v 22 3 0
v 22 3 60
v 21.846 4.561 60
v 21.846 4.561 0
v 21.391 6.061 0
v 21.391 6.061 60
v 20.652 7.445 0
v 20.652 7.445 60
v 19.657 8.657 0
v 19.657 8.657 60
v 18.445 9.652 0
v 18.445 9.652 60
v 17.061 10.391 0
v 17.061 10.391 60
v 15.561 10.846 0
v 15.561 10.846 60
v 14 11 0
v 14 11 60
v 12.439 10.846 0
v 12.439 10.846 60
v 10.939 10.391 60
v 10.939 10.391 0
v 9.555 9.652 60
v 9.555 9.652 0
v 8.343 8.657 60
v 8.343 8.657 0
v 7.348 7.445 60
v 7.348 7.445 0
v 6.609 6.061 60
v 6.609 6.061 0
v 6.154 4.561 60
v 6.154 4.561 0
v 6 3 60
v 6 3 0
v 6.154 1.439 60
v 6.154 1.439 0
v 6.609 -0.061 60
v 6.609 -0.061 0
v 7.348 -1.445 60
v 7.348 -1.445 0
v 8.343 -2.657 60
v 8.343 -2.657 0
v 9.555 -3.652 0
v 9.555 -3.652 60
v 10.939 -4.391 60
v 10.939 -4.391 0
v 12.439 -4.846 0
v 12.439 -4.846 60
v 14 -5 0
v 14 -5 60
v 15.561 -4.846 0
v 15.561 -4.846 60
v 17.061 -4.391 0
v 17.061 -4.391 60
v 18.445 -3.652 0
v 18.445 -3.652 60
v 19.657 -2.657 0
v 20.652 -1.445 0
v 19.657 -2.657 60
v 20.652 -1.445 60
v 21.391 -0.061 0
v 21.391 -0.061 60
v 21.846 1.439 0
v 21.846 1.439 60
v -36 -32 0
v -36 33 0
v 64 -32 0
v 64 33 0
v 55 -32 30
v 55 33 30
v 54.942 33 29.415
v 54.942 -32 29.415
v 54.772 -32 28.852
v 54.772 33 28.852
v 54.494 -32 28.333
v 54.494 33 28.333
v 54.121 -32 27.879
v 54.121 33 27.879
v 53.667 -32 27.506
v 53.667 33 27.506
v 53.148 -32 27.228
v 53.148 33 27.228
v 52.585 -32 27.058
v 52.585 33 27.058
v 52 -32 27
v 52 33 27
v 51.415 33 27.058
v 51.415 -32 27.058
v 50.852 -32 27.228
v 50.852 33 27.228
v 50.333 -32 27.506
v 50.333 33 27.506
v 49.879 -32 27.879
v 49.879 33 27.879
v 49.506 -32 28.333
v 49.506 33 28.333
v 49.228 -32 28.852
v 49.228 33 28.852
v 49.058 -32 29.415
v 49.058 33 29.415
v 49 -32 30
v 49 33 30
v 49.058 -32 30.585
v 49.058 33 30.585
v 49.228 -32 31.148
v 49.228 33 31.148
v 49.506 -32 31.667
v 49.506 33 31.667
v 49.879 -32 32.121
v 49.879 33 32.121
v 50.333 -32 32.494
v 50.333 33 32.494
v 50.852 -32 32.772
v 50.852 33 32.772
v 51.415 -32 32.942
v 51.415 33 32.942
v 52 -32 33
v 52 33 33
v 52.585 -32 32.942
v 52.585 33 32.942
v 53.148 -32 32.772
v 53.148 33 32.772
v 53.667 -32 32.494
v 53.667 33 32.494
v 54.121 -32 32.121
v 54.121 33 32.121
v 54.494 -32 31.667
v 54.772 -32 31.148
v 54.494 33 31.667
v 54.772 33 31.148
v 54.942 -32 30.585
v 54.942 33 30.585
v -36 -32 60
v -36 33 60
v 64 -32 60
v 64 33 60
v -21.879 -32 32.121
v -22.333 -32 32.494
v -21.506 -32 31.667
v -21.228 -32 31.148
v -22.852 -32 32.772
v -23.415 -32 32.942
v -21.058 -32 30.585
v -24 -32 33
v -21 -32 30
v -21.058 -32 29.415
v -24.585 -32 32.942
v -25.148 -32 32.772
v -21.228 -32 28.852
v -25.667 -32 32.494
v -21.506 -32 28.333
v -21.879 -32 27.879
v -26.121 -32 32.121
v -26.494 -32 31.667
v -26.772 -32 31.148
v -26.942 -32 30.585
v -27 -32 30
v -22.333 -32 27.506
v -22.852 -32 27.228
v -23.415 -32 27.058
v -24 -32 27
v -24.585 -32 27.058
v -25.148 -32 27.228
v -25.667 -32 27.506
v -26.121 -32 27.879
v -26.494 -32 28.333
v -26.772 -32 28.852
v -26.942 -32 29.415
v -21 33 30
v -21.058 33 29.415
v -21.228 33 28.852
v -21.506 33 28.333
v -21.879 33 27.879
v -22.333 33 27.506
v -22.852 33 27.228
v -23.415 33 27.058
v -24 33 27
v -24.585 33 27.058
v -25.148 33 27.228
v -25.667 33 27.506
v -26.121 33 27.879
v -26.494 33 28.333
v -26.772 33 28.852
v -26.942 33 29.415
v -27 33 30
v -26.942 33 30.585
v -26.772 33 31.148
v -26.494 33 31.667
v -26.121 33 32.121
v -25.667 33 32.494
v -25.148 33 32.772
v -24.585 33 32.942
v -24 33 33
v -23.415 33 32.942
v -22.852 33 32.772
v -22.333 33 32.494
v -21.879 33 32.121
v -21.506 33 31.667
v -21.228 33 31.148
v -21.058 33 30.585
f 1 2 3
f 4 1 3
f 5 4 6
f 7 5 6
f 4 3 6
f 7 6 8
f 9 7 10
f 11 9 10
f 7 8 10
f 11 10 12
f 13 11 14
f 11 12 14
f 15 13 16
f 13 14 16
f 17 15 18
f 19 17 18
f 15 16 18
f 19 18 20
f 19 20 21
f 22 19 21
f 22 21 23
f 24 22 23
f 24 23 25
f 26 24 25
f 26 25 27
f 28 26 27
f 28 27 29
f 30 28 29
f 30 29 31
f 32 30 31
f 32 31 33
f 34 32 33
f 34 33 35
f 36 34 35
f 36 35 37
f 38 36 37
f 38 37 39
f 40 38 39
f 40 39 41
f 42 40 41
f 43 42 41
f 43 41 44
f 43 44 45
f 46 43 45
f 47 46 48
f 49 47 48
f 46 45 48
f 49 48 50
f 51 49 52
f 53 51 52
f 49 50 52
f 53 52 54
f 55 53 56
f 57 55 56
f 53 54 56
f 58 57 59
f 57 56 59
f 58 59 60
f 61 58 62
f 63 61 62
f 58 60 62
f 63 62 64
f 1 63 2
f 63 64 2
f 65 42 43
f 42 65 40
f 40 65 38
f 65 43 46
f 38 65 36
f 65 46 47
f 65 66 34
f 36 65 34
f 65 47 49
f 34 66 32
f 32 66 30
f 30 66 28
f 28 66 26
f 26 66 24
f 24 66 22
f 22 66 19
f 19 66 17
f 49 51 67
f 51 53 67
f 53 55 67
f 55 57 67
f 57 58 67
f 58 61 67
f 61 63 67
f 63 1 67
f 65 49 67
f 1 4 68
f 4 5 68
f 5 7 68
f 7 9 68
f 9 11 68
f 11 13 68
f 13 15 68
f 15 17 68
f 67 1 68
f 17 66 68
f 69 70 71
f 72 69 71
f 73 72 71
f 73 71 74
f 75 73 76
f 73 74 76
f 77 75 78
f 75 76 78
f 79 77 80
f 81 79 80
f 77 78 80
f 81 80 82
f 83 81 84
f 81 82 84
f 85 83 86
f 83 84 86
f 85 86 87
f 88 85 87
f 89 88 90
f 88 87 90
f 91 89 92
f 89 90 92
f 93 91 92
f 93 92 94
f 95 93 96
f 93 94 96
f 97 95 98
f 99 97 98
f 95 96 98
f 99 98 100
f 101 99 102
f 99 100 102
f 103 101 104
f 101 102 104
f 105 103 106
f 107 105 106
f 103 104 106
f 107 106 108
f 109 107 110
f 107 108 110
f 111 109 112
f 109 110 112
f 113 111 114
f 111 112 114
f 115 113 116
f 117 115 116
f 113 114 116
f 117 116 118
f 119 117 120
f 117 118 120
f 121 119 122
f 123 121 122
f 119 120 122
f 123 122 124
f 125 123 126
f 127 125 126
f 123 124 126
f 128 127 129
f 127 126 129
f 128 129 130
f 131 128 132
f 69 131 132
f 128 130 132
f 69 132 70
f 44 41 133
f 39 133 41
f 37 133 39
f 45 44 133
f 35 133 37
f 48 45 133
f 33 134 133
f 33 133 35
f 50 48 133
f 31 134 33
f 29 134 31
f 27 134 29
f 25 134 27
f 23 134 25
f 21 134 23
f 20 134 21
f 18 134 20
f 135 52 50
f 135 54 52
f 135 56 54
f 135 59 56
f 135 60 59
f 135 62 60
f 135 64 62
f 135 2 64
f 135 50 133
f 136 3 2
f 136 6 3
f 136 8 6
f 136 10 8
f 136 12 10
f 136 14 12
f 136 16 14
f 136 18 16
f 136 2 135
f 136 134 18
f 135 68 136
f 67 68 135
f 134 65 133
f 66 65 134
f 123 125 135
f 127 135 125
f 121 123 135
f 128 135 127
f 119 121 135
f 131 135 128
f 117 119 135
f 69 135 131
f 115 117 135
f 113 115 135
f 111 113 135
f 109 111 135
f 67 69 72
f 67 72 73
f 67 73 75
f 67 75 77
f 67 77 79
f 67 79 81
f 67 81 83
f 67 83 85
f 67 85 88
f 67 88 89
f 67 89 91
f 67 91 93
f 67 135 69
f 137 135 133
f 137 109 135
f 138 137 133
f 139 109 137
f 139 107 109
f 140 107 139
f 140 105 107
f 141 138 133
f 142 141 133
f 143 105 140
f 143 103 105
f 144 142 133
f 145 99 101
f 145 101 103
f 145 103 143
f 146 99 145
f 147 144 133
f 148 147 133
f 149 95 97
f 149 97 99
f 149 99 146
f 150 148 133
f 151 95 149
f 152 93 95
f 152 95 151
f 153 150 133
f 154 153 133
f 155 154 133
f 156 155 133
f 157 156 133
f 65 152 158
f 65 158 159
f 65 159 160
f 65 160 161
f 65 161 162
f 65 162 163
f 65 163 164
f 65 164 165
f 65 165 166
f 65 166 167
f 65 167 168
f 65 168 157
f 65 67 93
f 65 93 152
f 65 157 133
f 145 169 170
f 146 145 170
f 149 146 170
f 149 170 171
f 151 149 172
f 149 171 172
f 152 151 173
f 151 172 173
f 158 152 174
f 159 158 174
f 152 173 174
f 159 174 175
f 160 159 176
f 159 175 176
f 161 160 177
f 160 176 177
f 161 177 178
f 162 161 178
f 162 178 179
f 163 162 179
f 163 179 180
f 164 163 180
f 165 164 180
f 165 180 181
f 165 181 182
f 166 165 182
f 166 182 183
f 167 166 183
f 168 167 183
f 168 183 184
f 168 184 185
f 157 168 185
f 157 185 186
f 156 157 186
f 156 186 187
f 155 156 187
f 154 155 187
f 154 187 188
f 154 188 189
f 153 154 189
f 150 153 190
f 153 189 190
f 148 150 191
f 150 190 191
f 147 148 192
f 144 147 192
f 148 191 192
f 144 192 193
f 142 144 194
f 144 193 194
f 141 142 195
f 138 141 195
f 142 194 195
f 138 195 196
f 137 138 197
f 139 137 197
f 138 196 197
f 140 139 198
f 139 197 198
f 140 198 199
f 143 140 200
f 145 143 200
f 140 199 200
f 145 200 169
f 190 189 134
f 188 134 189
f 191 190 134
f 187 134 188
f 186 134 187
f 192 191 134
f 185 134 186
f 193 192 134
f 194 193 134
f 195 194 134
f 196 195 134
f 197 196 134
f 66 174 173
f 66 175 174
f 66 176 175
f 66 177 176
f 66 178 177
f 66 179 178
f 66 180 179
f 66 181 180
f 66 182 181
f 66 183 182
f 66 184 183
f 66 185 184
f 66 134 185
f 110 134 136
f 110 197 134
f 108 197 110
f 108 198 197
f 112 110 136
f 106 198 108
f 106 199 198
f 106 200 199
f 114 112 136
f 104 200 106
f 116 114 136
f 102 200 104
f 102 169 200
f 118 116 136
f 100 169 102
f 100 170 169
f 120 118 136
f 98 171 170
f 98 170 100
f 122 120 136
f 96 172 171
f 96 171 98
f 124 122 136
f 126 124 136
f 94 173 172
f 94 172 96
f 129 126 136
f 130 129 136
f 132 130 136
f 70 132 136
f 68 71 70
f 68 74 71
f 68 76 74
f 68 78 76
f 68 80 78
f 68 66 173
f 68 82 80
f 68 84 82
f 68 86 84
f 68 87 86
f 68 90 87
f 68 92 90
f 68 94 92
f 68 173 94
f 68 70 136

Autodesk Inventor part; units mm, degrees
ref_plane "YZ Plane" through (0, 0, 0) normal (1, 0, 0) x (0, 1, 0)
ref_plane "XZ Plane" through (0, 0, 0) normal (0, 1, 0) x (-1, 0, 0)
ref_plane "XY Plane" through (0, 0, 0) normal (0, 0, 1) x (1, 0, 0)
sketch "Sketch1" plane through (0, 0, 0) normal (0, 0, 1) x (1, 0, 0)
  line L0 (-36, 33) -> (64, 33)
  line L1 (64, 33) -> (64, -32)
  line L2 (64, -32) -> (-36, -32)
  line L3 (-36, -32) -> (-36, 33)
  point P0 (0, 0)
  dimension "d0" = 100
  dimension "d1" = 65
extrude "Extrusion1" add sketch "Sketch1" along normal blind 60
sketch "Sketch2" plane through (0, 0, 60) normal (0, 0, 1) x (1, 0, 0)
  circle A0 centre (14, 3) radius 8
  line L0 (64, 33) -> (-36, 33) projected
  line L1 (64, -32) -> (64, 33) projected
  line L2 (-36, -32) -> (64, -32) projected
  point P0 (0, 0)
  dimension "d4" = 16
  dimension "d6" = 50
  dimension "d7" = 35
extrude "Extrusion2" cut sketch "Sketch2" against normal through all
sketch "Sketch3" plane through (-36, 33, 0) normal (0, 1, 0) x (1, 0, 0)
  circle A0 centre (12, -30) radius 3
  line L0 (100, 0) -> (0, 0) projected
  line L1 (0, 0) -> (0, -60) projected
  circle A1 centre (88, -30) radius 3
  line L2 (100, 0) -> (100, -60) projected
  point P0 (36, 0)
  dimension "d10" = 6
  dimension "d11" = 30
  dimension "d12" = 12
  dimension "d13" = 6
  dimension "d14" = 30
  dimension "d15" = 12
extrude "Extrusion3" cut sketch "Sketch3" against normal through all
properties part number "Pin Block" material "Brass, Soft Yellow, Welded"
